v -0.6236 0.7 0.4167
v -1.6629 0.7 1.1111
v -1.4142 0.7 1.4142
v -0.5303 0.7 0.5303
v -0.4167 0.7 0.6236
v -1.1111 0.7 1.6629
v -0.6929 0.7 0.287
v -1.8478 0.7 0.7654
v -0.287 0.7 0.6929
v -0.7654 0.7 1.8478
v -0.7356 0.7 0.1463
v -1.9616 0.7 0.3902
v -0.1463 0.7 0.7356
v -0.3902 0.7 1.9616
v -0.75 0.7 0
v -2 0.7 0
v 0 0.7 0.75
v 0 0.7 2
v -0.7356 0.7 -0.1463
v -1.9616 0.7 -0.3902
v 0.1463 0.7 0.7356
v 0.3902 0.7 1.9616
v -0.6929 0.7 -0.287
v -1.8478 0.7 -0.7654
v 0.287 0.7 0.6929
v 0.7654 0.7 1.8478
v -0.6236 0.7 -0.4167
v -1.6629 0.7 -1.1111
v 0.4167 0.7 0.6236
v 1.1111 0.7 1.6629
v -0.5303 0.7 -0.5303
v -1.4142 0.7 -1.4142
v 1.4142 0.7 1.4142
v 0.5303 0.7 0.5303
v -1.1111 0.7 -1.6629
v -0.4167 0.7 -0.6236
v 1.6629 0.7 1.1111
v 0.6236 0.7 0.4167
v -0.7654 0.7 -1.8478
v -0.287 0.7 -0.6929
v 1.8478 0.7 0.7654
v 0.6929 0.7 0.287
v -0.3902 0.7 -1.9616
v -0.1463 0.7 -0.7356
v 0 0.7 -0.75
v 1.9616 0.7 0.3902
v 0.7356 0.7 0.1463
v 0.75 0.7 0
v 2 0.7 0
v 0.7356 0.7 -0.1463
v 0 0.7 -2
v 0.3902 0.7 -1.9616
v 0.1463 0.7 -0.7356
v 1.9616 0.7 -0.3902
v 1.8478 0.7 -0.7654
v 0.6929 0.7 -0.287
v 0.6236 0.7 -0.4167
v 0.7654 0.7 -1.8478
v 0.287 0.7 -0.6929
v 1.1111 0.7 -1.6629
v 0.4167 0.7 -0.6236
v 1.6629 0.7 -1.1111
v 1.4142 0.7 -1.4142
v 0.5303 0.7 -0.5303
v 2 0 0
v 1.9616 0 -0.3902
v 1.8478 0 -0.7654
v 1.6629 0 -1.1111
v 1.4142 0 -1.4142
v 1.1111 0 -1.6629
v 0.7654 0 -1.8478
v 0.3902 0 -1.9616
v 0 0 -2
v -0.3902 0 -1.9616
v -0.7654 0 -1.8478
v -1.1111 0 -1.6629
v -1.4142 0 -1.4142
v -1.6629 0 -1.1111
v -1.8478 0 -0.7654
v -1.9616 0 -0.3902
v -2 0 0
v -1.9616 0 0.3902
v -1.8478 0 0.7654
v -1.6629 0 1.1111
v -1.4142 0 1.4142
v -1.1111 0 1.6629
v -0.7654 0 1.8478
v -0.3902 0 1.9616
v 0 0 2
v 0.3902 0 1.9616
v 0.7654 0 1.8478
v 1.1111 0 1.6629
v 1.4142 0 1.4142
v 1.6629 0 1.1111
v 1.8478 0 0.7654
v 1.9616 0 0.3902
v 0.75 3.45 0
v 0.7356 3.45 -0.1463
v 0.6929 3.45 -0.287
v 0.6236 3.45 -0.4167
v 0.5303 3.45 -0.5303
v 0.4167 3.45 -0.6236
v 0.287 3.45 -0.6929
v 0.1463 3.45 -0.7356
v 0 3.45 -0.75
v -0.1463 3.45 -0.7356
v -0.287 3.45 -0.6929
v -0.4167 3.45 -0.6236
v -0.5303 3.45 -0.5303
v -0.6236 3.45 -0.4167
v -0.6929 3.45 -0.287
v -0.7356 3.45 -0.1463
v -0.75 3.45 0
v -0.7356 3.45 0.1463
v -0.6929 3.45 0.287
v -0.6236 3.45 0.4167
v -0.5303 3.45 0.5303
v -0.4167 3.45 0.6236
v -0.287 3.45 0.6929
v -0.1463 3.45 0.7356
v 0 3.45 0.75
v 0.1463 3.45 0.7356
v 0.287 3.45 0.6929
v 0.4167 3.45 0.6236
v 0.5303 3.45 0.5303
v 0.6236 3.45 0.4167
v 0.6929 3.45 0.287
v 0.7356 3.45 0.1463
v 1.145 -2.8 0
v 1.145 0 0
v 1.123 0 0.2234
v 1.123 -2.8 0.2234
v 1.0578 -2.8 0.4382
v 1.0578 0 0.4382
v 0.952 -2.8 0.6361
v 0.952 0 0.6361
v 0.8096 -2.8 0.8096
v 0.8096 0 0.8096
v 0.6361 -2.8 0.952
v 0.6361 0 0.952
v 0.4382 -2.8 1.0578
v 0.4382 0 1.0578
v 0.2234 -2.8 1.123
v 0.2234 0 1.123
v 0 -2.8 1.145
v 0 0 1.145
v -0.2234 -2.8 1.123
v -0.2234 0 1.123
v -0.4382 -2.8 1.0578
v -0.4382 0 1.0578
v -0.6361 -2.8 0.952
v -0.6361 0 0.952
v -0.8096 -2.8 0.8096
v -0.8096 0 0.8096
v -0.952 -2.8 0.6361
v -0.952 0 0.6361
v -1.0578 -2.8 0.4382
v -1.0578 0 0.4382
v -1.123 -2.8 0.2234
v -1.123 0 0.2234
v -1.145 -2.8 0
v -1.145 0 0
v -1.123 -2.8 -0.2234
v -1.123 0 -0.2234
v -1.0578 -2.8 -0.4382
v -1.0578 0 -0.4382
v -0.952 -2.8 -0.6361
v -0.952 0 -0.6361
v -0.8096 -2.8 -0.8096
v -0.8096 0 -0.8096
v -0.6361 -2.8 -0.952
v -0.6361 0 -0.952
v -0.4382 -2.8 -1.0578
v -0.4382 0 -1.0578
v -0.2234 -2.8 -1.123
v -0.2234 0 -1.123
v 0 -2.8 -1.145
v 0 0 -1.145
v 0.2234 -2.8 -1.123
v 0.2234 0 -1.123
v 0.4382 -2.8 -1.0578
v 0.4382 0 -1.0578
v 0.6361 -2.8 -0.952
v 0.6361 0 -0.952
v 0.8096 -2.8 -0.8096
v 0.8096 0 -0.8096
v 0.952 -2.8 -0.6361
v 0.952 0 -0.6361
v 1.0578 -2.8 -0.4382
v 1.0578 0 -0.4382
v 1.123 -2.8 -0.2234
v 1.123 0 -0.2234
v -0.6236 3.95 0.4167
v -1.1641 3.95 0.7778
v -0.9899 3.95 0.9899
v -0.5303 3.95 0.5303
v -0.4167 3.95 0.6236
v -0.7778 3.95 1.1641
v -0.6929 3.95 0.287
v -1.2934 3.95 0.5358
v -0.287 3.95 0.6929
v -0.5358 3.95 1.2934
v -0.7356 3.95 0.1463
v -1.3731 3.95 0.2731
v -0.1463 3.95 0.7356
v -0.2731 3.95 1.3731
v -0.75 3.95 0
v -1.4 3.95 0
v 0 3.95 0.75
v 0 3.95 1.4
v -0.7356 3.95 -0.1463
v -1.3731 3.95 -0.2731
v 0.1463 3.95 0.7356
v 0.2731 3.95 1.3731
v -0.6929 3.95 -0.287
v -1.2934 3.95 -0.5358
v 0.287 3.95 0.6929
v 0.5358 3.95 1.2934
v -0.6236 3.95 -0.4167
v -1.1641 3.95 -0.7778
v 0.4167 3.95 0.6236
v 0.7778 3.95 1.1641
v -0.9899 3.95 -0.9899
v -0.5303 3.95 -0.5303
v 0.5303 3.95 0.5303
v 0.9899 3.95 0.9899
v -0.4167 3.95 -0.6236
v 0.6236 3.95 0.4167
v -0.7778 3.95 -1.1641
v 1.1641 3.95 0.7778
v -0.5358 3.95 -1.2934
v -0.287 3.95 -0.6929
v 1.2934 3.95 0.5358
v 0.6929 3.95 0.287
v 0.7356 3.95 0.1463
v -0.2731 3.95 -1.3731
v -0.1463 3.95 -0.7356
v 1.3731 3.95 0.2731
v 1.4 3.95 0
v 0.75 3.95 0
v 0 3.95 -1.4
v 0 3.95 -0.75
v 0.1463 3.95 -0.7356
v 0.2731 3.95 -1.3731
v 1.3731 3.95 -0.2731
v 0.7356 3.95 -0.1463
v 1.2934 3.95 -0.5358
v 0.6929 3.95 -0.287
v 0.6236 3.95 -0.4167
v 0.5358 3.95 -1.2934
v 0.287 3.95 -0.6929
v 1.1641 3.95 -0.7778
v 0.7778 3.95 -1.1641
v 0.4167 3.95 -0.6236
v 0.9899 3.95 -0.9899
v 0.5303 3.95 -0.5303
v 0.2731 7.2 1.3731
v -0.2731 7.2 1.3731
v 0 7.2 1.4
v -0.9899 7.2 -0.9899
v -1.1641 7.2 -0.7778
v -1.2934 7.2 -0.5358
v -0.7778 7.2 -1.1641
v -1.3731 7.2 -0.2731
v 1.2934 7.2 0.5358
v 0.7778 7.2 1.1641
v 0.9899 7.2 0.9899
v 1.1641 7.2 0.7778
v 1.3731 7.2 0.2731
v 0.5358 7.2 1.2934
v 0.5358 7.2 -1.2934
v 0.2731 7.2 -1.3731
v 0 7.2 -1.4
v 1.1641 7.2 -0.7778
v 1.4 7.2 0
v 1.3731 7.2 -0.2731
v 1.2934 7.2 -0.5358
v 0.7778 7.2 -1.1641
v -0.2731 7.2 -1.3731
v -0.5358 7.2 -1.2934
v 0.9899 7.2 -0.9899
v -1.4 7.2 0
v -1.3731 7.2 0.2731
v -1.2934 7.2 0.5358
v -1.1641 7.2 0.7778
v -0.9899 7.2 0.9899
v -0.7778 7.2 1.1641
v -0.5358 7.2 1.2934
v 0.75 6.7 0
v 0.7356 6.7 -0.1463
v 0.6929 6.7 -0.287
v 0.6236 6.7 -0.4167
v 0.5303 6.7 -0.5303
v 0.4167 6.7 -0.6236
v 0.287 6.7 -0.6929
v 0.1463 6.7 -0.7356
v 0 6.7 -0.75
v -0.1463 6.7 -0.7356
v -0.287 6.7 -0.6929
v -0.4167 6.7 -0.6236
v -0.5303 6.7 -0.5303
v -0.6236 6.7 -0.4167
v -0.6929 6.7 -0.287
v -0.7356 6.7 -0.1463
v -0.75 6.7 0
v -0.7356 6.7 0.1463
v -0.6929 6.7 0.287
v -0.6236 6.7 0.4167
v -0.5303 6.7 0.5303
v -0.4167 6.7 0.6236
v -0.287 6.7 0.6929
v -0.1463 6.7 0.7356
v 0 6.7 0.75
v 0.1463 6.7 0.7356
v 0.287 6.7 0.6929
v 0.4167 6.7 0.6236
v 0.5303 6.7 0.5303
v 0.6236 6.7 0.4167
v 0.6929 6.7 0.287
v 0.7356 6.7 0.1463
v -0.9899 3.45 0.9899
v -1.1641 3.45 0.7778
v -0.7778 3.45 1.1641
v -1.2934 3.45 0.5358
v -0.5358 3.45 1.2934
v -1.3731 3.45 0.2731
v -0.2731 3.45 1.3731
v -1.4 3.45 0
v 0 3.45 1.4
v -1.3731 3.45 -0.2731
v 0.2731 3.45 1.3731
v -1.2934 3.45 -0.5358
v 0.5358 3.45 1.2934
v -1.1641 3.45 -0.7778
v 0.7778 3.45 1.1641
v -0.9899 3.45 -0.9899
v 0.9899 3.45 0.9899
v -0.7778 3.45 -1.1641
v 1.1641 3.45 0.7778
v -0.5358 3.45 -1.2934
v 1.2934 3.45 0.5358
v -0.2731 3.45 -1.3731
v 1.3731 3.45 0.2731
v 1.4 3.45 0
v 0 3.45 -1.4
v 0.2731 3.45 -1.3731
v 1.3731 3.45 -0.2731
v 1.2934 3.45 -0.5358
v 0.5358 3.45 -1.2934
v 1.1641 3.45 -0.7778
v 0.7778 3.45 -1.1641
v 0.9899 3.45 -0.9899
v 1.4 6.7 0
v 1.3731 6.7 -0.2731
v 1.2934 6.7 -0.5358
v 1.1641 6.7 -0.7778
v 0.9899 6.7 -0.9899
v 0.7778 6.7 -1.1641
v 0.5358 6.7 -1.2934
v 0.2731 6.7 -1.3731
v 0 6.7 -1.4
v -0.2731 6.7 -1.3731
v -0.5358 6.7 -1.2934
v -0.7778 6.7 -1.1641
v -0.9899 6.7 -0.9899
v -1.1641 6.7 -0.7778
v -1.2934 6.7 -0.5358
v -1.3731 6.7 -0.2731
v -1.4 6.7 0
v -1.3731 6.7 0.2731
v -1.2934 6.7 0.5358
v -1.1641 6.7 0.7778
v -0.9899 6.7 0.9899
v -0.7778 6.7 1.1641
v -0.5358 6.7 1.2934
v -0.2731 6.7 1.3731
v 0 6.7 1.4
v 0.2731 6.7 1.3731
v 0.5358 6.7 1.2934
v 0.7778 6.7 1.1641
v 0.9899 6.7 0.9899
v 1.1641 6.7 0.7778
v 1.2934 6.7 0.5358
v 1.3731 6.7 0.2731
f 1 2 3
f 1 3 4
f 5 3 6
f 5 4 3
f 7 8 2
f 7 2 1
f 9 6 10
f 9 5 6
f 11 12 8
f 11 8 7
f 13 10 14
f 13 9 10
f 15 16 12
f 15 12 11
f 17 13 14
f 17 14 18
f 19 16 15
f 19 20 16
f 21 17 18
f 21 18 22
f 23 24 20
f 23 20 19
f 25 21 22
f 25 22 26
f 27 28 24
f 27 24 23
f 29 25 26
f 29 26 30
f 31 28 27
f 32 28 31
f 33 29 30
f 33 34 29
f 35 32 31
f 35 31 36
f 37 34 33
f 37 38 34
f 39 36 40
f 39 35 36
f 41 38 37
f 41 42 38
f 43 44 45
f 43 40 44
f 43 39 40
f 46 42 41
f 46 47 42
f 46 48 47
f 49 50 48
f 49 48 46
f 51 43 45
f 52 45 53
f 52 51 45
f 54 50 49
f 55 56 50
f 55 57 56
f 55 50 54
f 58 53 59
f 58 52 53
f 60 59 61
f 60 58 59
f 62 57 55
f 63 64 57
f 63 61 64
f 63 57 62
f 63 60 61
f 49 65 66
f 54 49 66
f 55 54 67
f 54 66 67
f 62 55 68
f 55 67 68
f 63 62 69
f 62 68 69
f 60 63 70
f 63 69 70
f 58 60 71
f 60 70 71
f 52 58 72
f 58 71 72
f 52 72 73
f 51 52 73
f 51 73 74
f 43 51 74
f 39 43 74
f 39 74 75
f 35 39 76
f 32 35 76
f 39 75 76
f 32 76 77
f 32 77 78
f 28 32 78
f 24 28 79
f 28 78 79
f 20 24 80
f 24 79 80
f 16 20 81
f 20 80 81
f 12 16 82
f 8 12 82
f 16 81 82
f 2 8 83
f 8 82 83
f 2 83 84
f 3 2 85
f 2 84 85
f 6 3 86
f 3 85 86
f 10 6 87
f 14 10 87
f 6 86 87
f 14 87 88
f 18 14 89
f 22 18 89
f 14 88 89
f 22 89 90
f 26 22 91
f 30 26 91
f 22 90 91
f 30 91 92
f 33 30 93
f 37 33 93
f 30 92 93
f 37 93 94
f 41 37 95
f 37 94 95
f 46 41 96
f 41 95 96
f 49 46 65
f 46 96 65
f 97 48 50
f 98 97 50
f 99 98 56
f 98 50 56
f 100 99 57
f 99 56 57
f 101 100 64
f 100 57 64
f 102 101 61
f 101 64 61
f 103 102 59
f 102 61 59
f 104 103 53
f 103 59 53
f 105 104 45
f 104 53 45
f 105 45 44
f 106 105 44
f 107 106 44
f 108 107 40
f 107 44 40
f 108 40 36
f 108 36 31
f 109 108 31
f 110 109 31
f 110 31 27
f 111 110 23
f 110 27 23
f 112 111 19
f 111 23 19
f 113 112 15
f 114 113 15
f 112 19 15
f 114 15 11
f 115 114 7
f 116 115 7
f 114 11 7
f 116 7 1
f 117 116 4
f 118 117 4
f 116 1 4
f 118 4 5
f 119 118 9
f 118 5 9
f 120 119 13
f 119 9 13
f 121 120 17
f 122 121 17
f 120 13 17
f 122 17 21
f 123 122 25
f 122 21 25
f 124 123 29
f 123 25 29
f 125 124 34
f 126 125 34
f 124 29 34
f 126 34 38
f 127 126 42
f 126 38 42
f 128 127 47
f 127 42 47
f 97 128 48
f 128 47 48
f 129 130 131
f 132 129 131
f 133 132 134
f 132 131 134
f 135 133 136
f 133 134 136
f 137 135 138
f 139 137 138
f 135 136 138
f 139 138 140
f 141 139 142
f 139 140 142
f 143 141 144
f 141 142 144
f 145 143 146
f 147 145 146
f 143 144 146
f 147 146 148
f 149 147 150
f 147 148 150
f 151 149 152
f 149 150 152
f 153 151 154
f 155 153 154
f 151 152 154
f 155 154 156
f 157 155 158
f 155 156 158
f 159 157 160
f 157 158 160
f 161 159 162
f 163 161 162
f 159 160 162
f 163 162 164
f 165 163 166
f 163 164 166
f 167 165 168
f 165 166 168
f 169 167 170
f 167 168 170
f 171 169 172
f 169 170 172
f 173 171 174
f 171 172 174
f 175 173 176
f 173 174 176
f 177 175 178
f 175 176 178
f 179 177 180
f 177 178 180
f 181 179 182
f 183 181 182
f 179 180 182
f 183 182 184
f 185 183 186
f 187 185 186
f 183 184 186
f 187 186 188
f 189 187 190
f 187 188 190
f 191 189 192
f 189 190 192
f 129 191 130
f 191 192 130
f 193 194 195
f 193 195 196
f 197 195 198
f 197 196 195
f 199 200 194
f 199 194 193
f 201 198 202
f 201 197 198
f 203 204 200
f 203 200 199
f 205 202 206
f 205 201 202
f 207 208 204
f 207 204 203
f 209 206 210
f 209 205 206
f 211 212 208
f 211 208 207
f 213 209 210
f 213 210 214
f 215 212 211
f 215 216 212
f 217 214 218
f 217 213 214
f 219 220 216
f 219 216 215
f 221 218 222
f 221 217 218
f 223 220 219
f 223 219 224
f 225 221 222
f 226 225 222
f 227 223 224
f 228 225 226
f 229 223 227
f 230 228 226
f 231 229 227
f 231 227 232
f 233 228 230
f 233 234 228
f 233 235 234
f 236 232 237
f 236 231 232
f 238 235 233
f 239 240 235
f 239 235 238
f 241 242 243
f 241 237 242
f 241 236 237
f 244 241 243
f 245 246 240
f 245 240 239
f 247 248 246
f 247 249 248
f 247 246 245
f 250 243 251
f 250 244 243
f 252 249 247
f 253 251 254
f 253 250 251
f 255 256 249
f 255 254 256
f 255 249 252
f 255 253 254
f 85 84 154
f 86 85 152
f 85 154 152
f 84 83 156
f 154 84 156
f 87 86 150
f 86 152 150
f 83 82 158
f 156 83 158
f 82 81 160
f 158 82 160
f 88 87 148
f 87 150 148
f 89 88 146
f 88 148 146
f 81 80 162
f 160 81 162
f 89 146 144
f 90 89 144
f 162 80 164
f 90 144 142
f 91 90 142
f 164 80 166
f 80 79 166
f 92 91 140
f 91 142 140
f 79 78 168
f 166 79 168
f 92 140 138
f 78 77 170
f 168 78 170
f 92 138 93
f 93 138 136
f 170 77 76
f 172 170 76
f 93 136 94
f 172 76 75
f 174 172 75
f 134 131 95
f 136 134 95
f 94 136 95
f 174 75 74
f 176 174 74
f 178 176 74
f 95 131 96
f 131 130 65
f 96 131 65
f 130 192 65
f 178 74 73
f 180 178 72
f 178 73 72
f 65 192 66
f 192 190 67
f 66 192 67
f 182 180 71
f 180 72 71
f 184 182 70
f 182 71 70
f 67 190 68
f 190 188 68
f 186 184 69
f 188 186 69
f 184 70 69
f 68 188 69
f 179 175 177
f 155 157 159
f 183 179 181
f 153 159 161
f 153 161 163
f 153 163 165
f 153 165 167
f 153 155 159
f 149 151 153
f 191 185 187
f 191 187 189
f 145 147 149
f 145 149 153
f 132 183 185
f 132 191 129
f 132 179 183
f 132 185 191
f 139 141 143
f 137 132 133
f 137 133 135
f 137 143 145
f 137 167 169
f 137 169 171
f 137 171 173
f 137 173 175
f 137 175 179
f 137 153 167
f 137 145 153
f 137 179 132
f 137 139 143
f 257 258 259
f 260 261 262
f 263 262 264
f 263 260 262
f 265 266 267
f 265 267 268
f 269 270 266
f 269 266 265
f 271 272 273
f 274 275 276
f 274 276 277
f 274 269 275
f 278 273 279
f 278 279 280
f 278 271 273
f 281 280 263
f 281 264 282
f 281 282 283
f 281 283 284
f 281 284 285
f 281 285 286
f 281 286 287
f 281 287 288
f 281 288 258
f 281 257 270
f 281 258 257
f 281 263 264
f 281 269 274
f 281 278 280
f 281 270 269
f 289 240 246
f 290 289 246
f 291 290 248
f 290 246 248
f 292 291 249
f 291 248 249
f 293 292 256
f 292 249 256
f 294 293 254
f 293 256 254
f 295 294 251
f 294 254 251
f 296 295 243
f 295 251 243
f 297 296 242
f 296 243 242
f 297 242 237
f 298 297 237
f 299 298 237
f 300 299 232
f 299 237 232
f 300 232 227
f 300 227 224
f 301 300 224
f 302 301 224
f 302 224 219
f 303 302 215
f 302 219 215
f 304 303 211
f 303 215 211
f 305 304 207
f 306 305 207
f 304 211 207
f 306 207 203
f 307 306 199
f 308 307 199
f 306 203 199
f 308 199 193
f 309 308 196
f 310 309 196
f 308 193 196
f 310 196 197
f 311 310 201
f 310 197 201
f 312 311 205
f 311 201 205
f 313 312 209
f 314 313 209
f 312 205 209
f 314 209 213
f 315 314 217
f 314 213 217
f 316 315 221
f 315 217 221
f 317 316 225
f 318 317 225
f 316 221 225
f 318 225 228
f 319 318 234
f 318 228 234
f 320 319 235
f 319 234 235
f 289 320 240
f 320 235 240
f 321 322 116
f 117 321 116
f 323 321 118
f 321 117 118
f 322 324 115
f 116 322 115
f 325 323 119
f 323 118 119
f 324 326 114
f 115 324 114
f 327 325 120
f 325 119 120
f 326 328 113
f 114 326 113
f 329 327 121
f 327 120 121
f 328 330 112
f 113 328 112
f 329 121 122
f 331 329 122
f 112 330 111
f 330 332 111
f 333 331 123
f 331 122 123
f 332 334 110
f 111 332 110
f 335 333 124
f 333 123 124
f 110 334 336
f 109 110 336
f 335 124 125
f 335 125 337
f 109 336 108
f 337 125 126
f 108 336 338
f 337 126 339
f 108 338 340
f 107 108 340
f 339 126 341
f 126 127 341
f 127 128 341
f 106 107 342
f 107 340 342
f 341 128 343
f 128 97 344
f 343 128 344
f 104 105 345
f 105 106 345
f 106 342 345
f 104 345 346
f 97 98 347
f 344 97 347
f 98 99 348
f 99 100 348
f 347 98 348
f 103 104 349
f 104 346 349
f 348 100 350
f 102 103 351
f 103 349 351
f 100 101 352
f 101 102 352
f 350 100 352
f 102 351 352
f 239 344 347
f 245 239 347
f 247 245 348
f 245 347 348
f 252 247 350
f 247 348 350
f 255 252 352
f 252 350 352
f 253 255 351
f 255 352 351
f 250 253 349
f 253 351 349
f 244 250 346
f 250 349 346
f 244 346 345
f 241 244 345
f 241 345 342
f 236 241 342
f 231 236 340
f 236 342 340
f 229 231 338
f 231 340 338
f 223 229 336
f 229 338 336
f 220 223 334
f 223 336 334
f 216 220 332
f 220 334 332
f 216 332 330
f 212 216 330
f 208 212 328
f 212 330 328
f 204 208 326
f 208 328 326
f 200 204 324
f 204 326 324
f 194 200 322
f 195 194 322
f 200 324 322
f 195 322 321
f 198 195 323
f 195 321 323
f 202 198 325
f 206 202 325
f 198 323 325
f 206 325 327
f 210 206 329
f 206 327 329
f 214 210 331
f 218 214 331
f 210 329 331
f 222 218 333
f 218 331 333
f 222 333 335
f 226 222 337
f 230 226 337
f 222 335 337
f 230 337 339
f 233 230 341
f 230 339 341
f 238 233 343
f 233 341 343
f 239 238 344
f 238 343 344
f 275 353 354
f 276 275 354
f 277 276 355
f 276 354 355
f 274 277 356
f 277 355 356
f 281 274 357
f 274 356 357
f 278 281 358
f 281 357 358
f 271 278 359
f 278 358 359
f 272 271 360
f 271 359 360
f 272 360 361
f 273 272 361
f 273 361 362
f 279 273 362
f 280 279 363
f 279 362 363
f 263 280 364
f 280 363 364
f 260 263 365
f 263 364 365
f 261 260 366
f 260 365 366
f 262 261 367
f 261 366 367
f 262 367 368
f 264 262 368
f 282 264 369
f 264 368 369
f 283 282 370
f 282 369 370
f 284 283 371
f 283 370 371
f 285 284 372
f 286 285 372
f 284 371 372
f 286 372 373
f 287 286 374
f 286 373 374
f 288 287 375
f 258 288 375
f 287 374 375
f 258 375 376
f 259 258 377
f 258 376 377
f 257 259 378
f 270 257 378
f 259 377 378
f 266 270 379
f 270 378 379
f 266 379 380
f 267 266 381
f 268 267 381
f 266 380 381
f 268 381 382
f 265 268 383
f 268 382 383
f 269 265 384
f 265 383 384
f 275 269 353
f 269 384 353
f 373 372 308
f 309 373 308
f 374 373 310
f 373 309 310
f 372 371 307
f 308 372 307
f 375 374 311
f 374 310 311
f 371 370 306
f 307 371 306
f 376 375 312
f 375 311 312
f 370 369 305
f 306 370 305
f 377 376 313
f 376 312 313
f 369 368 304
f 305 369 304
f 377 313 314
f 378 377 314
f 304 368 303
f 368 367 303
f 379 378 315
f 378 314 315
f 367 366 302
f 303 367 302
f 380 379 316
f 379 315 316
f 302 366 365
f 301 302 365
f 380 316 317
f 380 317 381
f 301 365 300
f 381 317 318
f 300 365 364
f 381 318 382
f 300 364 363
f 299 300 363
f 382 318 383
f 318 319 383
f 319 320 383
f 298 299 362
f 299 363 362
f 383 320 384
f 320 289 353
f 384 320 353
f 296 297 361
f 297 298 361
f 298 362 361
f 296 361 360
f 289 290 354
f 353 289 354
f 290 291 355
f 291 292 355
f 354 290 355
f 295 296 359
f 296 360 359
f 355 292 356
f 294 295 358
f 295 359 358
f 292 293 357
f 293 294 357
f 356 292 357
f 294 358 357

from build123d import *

# Parameters (mm, degrees)
SKETCH1_R           = 2
BOSS_EXTRUDE1_DEPTH = 0.7
SKETCH2_R           = 0.75
BOSS_EXTRUDE2_DEPTH = 2.75
SKETCH3_R           = 1.4
BOSS_EXTRUDE3_DEPTH = 0.5
SKETCH4_R           = 0.75
BOSS_EXTRUDE4_DEPTH = 2.75
SKETCH5_R           = 1.4
BOSS_EXTRUDE5_DEPTH = 0.5
SKETCH6_R           = 1.145
BOSS_EXTRUDE6_DEPTH = 2.8


with BuildPart() as part:
    # Sketch1 → Boss-Extrude1 (new body)
    with BuildSketch(Plane(origin=(0, 0, 0), x_dir=(1, 0, 0), z_dir=(0, 1, 0))):
        Circle(SKETCH1_R)
    extrude(amount=BOSS_EXTRUDE1_DEPTH)

    # Sketch2 → Boss-Extrude2 (add)
    with BuildSketch(Plane(origin=(0, 0.7, 0), x_dir=(1, 0, 0), z_dir=(0, 1, 0))):
        Circle(SKETCH2_R)
    extrude(amount=BOSS_EXTRUDE2_DEPTH)

    # Sketch3 → Boss-Extrude3 (add)
    with BuildSketch(Plane(origin=(0, 3.45, 0), x_dir=(1, 0, 0), z_dir=(0, 1, 0))):
        Circle(SKETCH3_R)
    extrude(amount=BOSS_EXTRUDE3_DEPTH)

    # Sketch4 → Boss-Extrude4 (add)
    with BuildSketch(Plane(origin=(0, 3.95, 0), x_dir=(1, 0, 0), z_dir=(0, 1, 0))):
        Circle(SKETCH4_R)
    extrude(amount=BOSS_EXTRUDE4_DEPTH)

    # Sketch5 → Boss-Extrude5 (add)
    with BuildSketch(Plane(origin=(0, 6.7, 0), x_dir=(1, 0, 0), z_dir=(0, 1, 0))):
        Circle(SKETCH5_R)
    extrude(amount=BOSS_EXTRUDE5_DEPTH)

    # Sketch6 → Boss-Extrude6 (add)
    with BuildSketch(Plane.XZ):
        Circle(SKETCH6_R)
    extrude(amount=BOSS_EXTRUDE6_DEPTH)


solid = part.part
